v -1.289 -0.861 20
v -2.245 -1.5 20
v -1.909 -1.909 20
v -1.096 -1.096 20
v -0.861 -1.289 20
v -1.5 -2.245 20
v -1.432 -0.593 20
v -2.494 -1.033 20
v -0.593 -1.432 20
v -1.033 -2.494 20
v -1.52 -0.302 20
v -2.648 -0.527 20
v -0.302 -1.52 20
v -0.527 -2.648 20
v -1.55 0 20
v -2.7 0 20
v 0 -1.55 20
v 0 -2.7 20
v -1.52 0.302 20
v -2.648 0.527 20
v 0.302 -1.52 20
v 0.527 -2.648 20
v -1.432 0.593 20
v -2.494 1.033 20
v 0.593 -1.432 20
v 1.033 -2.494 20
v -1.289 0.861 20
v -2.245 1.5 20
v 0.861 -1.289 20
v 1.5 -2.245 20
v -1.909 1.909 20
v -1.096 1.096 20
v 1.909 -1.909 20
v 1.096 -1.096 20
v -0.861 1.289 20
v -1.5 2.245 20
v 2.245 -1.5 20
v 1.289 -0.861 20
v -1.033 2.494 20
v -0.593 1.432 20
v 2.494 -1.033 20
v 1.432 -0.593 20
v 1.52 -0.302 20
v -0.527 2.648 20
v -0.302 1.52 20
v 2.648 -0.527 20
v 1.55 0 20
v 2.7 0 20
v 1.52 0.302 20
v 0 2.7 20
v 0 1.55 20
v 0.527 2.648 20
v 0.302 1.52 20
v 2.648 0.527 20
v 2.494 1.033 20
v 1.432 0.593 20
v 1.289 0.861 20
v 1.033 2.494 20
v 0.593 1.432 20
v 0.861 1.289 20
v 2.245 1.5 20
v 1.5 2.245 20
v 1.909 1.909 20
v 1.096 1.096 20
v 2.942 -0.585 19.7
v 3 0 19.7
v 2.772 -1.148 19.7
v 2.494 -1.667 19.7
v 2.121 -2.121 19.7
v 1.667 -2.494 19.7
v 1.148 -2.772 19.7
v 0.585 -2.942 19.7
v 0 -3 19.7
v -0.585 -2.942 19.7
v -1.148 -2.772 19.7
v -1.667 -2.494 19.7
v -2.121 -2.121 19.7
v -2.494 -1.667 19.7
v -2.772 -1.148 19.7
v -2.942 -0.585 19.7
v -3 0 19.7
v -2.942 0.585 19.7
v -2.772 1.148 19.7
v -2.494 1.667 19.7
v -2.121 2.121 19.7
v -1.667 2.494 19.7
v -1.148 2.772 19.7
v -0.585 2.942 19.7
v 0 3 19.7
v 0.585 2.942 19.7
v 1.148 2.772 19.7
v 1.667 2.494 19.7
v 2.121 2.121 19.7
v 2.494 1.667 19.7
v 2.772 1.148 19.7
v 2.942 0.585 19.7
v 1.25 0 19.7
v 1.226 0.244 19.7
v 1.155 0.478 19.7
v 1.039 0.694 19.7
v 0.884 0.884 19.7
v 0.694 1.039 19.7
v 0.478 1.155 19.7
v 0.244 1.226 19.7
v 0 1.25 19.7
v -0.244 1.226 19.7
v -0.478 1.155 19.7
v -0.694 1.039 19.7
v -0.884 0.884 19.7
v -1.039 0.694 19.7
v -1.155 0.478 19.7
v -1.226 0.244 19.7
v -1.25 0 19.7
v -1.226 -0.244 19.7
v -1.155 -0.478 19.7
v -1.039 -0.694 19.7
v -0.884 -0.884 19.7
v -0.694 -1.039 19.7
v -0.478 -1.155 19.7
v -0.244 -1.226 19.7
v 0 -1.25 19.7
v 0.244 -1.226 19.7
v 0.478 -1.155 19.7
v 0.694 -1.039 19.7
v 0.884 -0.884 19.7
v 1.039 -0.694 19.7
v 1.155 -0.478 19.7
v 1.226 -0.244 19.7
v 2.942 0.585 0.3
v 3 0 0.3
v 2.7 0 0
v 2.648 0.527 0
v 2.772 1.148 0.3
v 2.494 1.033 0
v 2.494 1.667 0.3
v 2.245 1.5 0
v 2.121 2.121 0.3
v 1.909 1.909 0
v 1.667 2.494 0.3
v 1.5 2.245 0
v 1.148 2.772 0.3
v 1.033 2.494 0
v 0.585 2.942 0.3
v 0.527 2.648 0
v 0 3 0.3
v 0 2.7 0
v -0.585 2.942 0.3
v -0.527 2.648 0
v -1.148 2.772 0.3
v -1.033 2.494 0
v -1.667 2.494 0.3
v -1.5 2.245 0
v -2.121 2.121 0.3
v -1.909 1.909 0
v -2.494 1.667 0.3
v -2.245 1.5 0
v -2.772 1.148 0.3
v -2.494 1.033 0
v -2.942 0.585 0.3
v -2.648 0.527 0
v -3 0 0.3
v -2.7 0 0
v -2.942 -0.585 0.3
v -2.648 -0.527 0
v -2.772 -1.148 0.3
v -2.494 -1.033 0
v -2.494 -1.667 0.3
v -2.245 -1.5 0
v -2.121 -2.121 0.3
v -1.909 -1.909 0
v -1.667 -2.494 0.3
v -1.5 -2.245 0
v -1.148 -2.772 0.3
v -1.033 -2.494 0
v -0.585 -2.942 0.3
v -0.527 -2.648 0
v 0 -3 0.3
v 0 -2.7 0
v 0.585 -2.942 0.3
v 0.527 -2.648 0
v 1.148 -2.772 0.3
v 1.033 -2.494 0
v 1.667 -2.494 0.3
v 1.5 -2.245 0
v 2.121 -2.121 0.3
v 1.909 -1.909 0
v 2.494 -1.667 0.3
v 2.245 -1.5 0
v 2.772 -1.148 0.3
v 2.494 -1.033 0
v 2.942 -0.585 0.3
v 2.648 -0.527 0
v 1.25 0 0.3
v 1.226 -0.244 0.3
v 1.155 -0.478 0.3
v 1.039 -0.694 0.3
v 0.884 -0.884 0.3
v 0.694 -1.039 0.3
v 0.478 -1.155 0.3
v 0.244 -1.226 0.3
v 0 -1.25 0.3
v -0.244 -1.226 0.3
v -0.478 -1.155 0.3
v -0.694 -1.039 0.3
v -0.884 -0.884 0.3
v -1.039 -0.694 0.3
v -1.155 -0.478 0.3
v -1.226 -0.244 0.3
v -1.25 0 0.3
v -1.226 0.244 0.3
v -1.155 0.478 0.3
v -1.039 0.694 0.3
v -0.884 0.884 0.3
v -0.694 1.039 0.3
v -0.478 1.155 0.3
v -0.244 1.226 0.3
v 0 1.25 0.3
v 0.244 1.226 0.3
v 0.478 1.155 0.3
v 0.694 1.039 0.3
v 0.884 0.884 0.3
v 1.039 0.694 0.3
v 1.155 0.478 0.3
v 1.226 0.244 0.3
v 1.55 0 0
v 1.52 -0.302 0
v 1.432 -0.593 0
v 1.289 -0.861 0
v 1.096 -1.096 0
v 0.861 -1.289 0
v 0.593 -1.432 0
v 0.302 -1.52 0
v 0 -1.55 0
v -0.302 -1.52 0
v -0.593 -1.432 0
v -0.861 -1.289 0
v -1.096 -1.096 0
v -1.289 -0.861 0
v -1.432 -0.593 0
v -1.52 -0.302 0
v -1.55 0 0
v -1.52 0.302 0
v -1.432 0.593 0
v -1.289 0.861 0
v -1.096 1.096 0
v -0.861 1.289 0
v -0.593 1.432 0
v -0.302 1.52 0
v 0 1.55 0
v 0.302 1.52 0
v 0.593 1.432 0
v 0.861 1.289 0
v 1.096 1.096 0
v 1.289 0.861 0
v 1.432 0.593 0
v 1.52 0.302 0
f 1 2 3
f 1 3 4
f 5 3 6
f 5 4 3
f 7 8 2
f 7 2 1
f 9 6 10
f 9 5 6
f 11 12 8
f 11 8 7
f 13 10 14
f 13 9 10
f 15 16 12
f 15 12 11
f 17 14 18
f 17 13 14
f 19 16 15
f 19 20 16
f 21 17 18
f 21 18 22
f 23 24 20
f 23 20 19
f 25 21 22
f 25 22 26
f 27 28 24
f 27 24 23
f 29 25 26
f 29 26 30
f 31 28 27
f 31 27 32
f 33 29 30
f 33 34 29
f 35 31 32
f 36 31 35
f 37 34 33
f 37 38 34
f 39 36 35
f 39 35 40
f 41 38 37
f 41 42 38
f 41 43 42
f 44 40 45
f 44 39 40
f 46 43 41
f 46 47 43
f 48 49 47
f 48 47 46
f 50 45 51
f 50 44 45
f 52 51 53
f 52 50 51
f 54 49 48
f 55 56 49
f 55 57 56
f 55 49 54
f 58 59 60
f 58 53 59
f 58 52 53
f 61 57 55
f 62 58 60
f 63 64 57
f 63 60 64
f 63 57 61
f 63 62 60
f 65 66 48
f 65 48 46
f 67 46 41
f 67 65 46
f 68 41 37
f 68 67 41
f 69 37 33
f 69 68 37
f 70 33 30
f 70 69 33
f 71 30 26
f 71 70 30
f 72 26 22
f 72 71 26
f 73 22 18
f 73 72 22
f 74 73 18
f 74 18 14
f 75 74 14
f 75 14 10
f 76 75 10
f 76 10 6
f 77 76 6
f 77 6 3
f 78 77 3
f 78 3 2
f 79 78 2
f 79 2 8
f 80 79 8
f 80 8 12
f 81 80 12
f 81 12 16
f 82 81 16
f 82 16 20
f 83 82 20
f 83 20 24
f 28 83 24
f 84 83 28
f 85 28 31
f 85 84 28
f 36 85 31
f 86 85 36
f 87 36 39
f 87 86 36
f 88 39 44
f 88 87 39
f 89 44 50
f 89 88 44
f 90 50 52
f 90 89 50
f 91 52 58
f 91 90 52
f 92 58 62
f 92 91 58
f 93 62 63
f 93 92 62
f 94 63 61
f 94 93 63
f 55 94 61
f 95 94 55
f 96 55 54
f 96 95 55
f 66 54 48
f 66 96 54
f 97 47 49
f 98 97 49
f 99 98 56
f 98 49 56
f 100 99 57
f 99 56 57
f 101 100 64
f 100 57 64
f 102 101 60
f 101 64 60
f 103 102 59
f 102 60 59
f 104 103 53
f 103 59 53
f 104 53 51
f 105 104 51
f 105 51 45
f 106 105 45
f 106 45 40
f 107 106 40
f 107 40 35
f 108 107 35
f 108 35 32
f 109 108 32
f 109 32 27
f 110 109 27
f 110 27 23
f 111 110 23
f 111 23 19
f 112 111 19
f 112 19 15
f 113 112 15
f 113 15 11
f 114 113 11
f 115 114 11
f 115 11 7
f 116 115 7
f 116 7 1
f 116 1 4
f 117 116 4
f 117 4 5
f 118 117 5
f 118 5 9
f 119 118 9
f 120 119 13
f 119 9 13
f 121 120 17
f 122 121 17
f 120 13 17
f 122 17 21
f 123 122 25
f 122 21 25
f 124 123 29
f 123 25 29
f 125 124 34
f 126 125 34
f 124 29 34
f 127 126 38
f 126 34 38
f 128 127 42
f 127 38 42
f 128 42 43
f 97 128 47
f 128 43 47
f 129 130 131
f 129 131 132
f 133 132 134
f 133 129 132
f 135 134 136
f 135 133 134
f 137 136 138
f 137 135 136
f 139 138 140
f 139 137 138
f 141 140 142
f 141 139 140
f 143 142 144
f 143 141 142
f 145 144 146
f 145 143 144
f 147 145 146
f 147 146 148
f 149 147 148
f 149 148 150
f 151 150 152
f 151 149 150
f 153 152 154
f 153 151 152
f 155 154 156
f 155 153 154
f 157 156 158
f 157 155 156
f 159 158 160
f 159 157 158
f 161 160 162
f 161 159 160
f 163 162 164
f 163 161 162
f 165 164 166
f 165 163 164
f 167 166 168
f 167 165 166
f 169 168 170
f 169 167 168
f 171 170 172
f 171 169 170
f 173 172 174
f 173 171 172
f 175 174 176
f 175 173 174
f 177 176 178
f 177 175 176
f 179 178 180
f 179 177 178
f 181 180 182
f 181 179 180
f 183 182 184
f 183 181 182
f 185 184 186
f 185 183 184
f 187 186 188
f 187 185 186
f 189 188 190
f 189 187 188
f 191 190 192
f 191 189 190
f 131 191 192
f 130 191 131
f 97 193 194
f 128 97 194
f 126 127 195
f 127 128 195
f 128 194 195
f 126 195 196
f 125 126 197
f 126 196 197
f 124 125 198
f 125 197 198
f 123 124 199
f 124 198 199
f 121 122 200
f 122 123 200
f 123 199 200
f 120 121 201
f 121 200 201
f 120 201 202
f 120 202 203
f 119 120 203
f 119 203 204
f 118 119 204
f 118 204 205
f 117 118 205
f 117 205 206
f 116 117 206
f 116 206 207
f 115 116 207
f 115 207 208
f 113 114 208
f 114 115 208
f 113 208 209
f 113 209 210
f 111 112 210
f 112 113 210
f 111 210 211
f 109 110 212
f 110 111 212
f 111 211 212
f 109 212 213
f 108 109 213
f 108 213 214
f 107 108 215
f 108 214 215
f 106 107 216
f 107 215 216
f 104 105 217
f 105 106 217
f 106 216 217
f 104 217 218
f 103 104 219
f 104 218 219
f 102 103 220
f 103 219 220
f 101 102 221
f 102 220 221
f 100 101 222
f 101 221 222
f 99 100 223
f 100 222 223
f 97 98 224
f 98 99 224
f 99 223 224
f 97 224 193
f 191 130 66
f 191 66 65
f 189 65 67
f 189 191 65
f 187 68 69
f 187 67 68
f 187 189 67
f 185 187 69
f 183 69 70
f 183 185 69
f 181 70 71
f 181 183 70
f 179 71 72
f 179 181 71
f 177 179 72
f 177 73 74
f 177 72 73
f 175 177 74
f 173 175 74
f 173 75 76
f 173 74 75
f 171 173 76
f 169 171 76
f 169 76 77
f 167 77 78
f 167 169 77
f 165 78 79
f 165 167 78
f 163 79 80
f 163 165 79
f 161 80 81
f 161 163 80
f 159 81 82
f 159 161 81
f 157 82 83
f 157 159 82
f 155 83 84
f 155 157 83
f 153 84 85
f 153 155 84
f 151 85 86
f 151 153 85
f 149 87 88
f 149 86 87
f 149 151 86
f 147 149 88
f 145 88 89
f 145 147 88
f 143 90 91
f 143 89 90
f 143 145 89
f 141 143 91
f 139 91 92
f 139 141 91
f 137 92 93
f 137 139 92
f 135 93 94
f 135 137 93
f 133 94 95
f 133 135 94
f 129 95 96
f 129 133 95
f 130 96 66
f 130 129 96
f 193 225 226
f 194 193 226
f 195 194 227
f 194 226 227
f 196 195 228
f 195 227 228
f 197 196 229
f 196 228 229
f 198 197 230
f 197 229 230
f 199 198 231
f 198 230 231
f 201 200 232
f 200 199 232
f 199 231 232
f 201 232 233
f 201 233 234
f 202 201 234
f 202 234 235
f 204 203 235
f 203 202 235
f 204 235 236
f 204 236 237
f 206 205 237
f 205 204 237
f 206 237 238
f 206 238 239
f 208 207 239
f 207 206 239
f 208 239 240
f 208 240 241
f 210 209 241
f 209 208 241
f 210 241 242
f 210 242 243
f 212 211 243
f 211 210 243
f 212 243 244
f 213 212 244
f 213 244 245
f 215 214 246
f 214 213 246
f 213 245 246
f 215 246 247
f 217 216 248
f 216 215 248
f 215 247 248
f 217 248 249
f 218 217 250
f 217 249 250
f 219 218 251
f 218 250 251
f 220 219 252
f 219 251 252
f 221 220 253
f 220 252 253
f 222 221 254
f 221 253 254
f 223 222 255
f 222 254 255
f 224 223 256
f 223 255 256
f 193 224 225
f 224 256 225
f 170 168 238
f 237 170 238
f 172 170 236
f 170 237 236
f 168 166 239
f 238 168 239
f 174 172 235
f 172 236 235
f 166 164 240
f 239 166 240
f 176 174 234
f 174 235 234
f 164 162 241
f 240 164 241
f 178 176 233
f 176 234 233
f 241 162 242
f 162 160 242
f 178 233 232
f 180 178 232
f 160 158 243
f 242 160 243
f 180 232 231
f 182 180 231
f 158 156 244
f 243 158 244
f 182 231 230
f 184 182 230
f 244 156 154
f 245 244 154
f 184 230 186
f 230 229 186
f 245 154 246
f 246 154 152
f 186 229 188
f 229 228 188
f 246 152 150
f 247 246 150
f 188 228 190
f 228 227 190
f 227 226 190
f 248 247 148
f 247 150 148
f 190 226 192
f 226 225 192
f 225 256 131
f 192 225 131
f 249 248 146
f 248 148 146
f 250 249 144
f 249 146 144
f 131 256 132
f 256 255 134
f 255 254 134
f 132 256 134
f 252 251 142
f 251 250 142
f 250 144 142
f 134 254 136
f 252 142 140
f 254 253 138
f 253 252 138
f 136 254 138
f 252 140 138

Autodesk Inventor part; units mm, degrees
ref_plane "YZ Plane" through (0, 0, 0) normal (1, 0, 0) x (0, 1, 0)
ref_plane "XZ Plane" through (0, 0, 0) normal (0, 1, 0) x (-1, 0, 0)
ref_plane "XY Plane" through (0, 0, 0) normal (0, 0, 1) x (1, 0, 0)
sketch "スケッチ1" plane through (0, 0, 0) normal (0, 0, 1) x (1, 0, 0)
  circle A0 centre (0, 0) radius 3
  circle A1 centre (0, 0) radius 1.25
  dimension "d0" = 6
  dimension "d1" = 2.5
extrude "押し出し1" add sketch "スケッチ1" along normal blind 20
chamfer "面取り1" distance 0.3 angle 45 4 edges at (-3, 0, 20) (-1.25, 0, 20) (-3, 0, 0) (-1.25, 0, 0)
thread "ねじ1" size "M3x0.5" class "6H" standard "ANSI Metric M Profile" full length
properties part number "p9ALshaft" material "アルミニウム 2014-T4"
